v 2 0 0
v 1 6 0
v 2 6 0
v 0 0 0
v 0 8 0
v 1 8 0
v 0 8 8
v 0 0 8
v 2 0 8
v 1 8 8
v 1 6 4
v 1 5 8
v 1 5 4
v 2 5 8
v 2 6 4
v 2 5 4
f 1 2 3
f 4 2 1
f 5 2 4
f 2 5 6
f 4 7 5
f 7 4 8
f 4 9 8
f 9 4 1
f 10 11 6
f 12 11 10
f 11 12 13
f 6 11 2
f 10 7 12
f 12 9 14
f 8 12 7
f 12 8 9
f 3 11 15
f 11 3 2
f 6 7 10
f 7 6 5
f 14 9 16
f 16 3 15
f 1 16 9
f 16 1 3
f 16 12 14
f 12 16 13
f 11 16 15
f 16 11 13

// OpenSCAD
union() {
    translate([0, 0, 0]) cube([1, 1, 1]);
    translate([0, 0, 1]) cube([1, 1, 1]);
    translate([0, 0, 2]) cube([1, 1, 1]);
    translate([0, 0, 3]) cube([1, 1, 1]);
    translate([0, 0, 4]) cube([1, 1, 1]);
    translate([0, 0, 5]) cube([1, 1, 1]);
    translate([0, 0, 6]) cube([1, 1, 1]);
    translate([0, 0, 7]) cube([1, 1, 1]);
    translate([0, 1, 0]) cube([1, 1, 1]);
    translate([0, 1, 1]) cube([1, 1, 1]);
    translate([0, 1, 2]) cube([1, 1, 1]);
    translate([0, 1, 3]) cube([1, 1, 1]);
    translate([0, 1, 4]) cube([1, 1, 1]);
    translate([0, 1, 5]) cube([1, 1, 1]);
    translate([0, 1, 6]) cube([1, 1, 1]);
    translate([0, 1, 7]) cube([1, 1, 1]);
    translate([0, 2, 0]) cube([1, 1, 1]);
    translate([0, 2, 1]) cube([1, 1, 1]);
    translate([0, 2, 2]) cube([1, 1, 1]);
    translate([0, 2, 3]) cube([1, 1, 1]);
    translate([0, 2, 4]) cube([1, 1, 1]);
    translate([0, 2, 5]) cube([1, 1, 1]);
    translate([0, 2, 6]) cube([1, 1, 1]);
    translate([0, 2, 7]) cube([1, 1, 1]);
    translate([0, 3, 0]) cube([1, 1, 1]);
    translate([0, 3, 1]) cube([1, 1, 1]);
    translate([0, 3, 2]) cube([1, 1, 1]);
    translate([0, 3, 3]) cube([1, 1, 1]);
    translate([0, 3, 4]) cube([1, 1, 1]);
    translate([0, 3, 5]) cube([1, 1, 1]);
    translate([0, 3, 6]) cube([1, 1, 1]);
    translate([0, 3, 7]) cube([1, 1, 1]);
    translate([0, 4, 0]) cube([1, 1, 1]);
    translate([0, 4, 1]) cube([1, 1, 1]);
    translate([0, 4, 2]) cube([1, 1, 1]);
    translate([0, 4, 3]) cube([1, 1, 1]);
    translate([0, 4, 4]) cube([1, 1, 1]);
    translate([0, 4, 5]) cube([1, 1, 1]);
    translate([0, 4, 6]) cube([1, 1, 1]);
    translate([0, 4, 7]) cube([1, 1, 1]);
    translate([0, 5, 0]) cube([1, 1, 1]);
    translate([0, 5, 1]) cube([1, 1, 1]);
    translate([0, 5, 2]) cube([1, 1, 1]);
    translate([0, 5, 3]) cube([1, 1, 1]);
    translate([0, 5, 4]) cube([1, 1, 1]);
    translate([0, 5, 5]) cube([1, 1, 1]);
    translate([0, 5, 6]) cube([1, 1, 1]);
    translate([0, 5, 7]) cube([1, 1, 1]);
    translate([0, 6, 0]) cube([1, 1, 1]);
    translate([0, 6, 1]) cube([1, 1, 1]);
    translate([0, 6, 2]) cube([1, 1, 1]);
    translate([0, 6, 3]) cube([1, 1, 1]);
    translate([0, 6, 4]) cube([1, 1, 1]);
    translate([0, 6, 5]) cube([1, 1, 1]);
    translate([0, 6, 6]) cube([1, 1, 1]);
    translate([0, 6, 7]) cube([1, 1, 1]);
    translate([0, 7, 0]) cube([1, 1, 1]);
    translate([0, 7, 1]) cube([1, 1, 1]);
    translate([0, 7, 2]) cube([1, 1, 1]);
    translate([0, 7, 3]) cube([1, 1, 1]);
    translate([0, 7, 4]) cube([1, 1, 1]);
    translate([0, 7, 5]) cube([1, 1, 1]);
    translate([0, 7, 6]) cube([1, 1, 1]);
    translate([0, 7, 7]) cube([1, 1, 1]);
    translate([1, 0, 0]) cube([1, 1, 1]);
    translate([1, 0, 1]) cube([1, 1, 1]);
    translate([1, 0, 2]) cube([1, 1, 1]);
    translate([1, 0, 3]) cube([1, 1, 1]);
    translate([1, 0, 4]) cube([1, 1, 1]);
    translate([1, 0, 5]) cube([1, 1, 1]);
    translate([1, 0, 6]) cube([1, 1, 1]);
    translate([1, 0, 7]) cube([1, 1, 1]);
    translate([1, 1, 0]) cube([1, 1, 1]);
    translate([1, 1, 1]) cube([1, 1, 1]);
    translate([1, 1, 2]) cube([1, 1, 1]);
    translate([1, 1, 3]) cube([1, 1, 1]);
    translate([1, 1, 4]) cube([1, 1, 1]);
    translate([1, 1, 5]) cube([1, 1, 1]);
    translate([1, 1, 6]) cube([1, 1, 1]);
    translate([1, 1, 7]) cube([1, 1, 1]);
    translate([1, 2, 0]) cube([1, 1, 1]);
    translate([1, 2, 1]) cube([1, 1, 1]);
    translate([1, 2, 2]) cube([1, 1, 1]);
    translate([1, 2, 3]) cube([1, 1, 1]);
    translate([1, 2, 4]) cube([1, 1, 1]);
    translate([1, 2, 5]) cube([1, 1, 1]);
    translate([1, 2, 6]) cube([1, 1, 1]);
    translate([1, 2, 7]) cube([1, 1, 1]);
    translate([1, 3, 0]) cube([1, 1, 1]);
    translate([1, 3, 1]) cube([1, 1, 1]);
    translate([1, 3, 2]) cube([1, 1, 1]);
    translate([1, 3, 3]) cube([1, 1, 1]);
    translate([1, 3, 4]) cube([1, 1, 1]);
    translate([1, 3, 5]) cube([1, 1, 1]);
    translate([1, 3, 6]) cube([1, 1, 1]);
    translate([1, 3, 7]) cube([1, 1, 1]);
    translate([1, 4, 0]) cube([1, 1, 1]);
    translate([1, 4, 1]) cube([1, 1, 1]);
    translate([1, 4, 2]) cube([1, 1, 1]);
    translate([1, 4, 3]) cube([1, 1, 1]);
    translate([1, 4, 4]) cube([1, 1, 1]);
    translate([1, 4, 5]) cube([1, 1, 1]);
    translate([1, 4, 6]) cube([1, 1, 1]);
    translate([1, 4, 7]) cube([1, 1, 1]);
    translate([1, 5, 0]) cube([1, 1, 1]);
    translate([1, 5, 1]) cube([1, 1, 1]);
    translate([1, 5, 2]) cube([1, 1, 1]);
    translate([1, 5, 3]) cube([1, 1, 1]);
}
